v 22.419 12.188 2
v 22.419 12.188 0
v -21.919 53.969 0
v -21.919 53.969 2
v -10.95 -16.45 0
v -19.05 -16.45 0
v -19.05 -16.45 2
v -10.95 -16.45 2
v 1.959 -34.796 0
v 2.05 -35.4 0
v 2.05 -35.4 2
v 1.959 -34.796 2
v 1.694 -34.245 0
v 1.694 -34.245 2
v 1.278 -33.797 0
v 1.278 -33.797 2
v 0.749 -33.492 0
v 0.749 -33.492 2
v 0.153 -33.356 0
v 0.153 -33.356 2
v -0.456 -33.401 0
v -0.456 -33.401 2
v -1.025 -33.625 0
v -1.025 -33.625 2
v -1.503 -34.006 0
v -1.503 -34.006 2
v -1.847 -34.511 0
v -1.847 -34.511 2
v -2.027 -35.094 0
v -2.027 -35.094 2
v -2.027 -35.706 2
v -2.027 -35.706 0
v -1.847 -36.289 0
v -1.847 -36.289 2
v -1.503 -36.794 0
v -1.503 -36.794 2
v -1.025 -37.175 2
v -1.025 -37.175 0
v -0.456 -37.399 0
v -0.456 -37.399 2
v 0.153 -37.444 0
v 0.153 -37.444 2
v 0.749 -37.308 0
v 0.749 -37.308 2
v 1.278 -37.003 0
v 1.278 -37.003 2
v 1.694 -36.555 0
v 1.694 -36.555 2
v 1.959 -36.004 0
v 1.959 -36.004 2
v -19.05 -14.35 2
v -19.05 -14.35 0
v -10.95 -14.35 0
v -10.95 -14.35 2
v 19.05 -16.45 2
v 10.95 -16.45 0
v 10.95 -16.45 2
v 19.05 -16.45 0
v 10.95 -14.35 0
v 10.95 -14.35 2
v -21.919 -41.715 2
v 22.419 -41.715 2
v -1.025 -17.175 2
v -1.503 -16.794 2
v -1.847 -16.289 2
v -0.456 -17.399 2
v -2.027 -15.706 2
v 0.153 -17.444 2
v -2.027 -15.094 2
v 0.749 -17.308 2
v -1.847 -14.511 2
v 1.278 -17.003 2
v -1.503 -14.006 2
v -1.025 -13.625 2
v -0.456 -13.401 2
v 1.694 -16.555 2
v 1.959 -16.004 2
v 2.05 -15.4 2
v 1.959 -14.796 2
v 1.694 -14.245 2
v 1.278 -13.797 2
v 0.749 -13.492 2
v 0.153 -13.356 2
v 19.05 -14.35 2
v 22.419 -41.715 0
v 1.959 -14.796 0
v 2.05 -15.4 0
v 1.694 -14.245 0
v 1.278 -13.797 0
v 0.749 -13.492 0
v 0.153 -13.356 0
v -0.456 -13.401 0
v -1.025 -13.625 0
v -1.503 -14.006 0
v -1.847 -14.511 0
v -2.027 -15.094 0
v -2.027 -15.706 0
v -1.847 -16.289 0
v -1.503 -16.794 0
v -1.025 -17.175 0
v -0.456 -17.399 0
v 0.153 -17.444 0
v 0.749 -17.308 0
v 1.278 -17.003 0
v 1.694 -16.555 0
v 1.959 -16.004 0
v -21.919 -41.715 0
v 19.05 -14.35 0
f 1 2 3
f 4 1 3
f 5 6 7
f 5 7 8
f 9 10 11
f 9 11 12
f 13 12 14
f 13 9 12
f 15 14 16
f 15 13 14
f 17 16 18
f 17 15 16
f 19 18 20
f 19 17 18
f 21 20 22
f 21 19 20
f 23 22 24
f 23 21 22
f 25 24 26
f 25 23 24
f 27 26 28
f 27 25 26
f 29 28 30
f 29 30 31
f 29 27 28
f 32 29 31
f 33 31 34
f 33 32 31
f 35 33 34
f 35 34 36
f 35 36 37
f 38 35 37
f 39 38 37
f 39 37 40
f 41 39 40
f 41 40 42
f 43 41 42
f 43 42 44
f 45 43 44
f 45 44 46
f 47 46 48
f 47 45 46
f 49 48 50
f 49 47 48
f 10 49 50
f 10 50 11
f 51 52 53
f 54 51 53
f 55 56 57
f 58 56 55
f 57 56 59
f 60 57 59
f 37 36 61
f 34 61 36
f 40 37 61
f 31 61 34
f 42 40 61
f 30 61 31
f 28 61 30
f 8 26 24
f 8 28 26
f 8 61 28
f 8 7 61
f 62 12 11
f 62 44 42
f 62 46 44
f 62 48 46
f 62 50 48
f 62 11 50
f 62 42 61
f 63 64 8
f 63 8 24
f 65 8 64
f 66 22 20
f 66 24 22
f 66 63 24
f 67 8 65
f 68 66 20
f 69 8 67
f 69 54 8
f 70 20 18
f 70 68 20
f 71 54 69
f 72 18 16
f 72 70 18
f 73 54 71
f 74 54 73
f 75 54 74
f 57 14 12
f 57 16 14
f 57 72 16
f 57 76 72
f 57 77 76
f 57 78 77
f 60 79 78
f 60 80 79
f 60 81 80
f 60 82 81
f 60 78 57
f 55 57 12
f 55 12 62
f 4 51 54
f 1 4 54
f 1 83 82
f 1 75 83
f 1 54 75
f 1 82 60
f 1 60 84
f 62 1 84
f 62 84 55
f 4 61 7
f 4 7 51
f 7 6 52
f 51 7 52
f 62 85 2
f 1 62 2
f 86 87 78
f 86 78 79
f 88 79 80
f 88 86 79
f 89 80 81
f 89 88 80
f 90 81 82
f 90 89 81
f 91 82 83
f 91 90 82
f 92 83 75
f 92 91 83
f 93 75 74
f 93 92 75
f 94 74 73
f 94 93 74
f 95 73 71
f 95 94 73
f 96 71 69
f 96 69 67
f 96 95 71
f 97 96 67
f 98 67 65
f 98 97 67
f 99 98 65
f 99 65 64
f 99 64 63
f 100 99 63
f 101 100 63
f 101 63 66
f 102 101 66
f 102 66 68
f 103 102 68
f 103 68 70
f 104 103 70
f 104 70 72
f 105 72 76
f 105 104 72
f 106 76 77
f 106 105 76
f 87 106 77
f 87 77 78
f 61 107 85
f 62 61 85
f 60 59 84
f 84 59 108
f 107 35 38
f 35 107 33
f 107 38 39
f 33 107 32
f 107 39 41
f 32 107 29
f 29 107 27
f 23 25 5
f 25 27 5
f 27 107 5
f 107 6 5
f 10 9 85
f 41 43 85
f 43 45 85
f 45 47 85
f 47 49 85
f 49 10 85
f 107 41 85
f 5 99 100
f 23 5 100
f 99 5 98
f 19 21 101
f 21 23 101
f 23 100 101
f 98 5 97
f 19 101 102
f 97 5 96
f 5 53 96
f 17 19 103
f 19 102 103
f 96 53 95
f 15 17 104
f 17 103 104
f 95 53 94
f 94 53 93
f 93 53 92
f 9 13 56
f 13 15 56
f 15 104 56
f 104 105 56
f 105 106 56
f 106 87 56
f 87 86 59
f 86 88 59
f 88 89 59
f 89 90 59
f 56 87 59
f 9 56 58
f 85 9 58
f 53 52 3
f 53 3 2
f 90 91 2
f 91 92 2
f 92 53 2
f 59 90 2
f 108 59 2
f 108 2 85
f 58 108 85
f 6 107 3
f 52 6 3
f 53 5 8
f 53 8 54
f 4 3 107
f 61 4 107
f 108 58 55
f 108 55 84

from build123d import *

# Parameters (mm, degrees)
SKETCH_1_R      = 2.05
SKETCH_1_W      = 8.1
SKETCH_1_H      = 2.1
EXTRUDE_1_DEPTH = 2


with BuildPart() as part:
    # 草图1 → 凸台-拉伸1 (new body)
    with BuildSketch(Plane.XY):
        Polygon((-21.91868524, -9.787808432), (-21.91868524, -41.714516484), (22.419428501, -41.714516484), (22.419428501, -9.787808432), (22.419428501, 12.188083696), (-21.91868524, 53.968649146), align=None)
        with Locations((0, -35.4)):
            Circle(SKETCH_1_R, mode=Mode.SUBTRACT)
        with Locations((0, -15.4)):
            Circle(SKETCH_1_R, mode=Mode.SUBTRACT)
        with Locations((-15, -15.4)):
            Rectangle(SKETCH_1_W, SKETCH_1_H, mode=Mode.SUBTRACT)
        with Locations((15, -15.4)):
            Rectangle(SKETCH_1_W, SKETCH_1_H, mode=Mode.SUBTRACT)
    extrude(amount=EXTRUDE_1_DEPTH)


solid = part.part
